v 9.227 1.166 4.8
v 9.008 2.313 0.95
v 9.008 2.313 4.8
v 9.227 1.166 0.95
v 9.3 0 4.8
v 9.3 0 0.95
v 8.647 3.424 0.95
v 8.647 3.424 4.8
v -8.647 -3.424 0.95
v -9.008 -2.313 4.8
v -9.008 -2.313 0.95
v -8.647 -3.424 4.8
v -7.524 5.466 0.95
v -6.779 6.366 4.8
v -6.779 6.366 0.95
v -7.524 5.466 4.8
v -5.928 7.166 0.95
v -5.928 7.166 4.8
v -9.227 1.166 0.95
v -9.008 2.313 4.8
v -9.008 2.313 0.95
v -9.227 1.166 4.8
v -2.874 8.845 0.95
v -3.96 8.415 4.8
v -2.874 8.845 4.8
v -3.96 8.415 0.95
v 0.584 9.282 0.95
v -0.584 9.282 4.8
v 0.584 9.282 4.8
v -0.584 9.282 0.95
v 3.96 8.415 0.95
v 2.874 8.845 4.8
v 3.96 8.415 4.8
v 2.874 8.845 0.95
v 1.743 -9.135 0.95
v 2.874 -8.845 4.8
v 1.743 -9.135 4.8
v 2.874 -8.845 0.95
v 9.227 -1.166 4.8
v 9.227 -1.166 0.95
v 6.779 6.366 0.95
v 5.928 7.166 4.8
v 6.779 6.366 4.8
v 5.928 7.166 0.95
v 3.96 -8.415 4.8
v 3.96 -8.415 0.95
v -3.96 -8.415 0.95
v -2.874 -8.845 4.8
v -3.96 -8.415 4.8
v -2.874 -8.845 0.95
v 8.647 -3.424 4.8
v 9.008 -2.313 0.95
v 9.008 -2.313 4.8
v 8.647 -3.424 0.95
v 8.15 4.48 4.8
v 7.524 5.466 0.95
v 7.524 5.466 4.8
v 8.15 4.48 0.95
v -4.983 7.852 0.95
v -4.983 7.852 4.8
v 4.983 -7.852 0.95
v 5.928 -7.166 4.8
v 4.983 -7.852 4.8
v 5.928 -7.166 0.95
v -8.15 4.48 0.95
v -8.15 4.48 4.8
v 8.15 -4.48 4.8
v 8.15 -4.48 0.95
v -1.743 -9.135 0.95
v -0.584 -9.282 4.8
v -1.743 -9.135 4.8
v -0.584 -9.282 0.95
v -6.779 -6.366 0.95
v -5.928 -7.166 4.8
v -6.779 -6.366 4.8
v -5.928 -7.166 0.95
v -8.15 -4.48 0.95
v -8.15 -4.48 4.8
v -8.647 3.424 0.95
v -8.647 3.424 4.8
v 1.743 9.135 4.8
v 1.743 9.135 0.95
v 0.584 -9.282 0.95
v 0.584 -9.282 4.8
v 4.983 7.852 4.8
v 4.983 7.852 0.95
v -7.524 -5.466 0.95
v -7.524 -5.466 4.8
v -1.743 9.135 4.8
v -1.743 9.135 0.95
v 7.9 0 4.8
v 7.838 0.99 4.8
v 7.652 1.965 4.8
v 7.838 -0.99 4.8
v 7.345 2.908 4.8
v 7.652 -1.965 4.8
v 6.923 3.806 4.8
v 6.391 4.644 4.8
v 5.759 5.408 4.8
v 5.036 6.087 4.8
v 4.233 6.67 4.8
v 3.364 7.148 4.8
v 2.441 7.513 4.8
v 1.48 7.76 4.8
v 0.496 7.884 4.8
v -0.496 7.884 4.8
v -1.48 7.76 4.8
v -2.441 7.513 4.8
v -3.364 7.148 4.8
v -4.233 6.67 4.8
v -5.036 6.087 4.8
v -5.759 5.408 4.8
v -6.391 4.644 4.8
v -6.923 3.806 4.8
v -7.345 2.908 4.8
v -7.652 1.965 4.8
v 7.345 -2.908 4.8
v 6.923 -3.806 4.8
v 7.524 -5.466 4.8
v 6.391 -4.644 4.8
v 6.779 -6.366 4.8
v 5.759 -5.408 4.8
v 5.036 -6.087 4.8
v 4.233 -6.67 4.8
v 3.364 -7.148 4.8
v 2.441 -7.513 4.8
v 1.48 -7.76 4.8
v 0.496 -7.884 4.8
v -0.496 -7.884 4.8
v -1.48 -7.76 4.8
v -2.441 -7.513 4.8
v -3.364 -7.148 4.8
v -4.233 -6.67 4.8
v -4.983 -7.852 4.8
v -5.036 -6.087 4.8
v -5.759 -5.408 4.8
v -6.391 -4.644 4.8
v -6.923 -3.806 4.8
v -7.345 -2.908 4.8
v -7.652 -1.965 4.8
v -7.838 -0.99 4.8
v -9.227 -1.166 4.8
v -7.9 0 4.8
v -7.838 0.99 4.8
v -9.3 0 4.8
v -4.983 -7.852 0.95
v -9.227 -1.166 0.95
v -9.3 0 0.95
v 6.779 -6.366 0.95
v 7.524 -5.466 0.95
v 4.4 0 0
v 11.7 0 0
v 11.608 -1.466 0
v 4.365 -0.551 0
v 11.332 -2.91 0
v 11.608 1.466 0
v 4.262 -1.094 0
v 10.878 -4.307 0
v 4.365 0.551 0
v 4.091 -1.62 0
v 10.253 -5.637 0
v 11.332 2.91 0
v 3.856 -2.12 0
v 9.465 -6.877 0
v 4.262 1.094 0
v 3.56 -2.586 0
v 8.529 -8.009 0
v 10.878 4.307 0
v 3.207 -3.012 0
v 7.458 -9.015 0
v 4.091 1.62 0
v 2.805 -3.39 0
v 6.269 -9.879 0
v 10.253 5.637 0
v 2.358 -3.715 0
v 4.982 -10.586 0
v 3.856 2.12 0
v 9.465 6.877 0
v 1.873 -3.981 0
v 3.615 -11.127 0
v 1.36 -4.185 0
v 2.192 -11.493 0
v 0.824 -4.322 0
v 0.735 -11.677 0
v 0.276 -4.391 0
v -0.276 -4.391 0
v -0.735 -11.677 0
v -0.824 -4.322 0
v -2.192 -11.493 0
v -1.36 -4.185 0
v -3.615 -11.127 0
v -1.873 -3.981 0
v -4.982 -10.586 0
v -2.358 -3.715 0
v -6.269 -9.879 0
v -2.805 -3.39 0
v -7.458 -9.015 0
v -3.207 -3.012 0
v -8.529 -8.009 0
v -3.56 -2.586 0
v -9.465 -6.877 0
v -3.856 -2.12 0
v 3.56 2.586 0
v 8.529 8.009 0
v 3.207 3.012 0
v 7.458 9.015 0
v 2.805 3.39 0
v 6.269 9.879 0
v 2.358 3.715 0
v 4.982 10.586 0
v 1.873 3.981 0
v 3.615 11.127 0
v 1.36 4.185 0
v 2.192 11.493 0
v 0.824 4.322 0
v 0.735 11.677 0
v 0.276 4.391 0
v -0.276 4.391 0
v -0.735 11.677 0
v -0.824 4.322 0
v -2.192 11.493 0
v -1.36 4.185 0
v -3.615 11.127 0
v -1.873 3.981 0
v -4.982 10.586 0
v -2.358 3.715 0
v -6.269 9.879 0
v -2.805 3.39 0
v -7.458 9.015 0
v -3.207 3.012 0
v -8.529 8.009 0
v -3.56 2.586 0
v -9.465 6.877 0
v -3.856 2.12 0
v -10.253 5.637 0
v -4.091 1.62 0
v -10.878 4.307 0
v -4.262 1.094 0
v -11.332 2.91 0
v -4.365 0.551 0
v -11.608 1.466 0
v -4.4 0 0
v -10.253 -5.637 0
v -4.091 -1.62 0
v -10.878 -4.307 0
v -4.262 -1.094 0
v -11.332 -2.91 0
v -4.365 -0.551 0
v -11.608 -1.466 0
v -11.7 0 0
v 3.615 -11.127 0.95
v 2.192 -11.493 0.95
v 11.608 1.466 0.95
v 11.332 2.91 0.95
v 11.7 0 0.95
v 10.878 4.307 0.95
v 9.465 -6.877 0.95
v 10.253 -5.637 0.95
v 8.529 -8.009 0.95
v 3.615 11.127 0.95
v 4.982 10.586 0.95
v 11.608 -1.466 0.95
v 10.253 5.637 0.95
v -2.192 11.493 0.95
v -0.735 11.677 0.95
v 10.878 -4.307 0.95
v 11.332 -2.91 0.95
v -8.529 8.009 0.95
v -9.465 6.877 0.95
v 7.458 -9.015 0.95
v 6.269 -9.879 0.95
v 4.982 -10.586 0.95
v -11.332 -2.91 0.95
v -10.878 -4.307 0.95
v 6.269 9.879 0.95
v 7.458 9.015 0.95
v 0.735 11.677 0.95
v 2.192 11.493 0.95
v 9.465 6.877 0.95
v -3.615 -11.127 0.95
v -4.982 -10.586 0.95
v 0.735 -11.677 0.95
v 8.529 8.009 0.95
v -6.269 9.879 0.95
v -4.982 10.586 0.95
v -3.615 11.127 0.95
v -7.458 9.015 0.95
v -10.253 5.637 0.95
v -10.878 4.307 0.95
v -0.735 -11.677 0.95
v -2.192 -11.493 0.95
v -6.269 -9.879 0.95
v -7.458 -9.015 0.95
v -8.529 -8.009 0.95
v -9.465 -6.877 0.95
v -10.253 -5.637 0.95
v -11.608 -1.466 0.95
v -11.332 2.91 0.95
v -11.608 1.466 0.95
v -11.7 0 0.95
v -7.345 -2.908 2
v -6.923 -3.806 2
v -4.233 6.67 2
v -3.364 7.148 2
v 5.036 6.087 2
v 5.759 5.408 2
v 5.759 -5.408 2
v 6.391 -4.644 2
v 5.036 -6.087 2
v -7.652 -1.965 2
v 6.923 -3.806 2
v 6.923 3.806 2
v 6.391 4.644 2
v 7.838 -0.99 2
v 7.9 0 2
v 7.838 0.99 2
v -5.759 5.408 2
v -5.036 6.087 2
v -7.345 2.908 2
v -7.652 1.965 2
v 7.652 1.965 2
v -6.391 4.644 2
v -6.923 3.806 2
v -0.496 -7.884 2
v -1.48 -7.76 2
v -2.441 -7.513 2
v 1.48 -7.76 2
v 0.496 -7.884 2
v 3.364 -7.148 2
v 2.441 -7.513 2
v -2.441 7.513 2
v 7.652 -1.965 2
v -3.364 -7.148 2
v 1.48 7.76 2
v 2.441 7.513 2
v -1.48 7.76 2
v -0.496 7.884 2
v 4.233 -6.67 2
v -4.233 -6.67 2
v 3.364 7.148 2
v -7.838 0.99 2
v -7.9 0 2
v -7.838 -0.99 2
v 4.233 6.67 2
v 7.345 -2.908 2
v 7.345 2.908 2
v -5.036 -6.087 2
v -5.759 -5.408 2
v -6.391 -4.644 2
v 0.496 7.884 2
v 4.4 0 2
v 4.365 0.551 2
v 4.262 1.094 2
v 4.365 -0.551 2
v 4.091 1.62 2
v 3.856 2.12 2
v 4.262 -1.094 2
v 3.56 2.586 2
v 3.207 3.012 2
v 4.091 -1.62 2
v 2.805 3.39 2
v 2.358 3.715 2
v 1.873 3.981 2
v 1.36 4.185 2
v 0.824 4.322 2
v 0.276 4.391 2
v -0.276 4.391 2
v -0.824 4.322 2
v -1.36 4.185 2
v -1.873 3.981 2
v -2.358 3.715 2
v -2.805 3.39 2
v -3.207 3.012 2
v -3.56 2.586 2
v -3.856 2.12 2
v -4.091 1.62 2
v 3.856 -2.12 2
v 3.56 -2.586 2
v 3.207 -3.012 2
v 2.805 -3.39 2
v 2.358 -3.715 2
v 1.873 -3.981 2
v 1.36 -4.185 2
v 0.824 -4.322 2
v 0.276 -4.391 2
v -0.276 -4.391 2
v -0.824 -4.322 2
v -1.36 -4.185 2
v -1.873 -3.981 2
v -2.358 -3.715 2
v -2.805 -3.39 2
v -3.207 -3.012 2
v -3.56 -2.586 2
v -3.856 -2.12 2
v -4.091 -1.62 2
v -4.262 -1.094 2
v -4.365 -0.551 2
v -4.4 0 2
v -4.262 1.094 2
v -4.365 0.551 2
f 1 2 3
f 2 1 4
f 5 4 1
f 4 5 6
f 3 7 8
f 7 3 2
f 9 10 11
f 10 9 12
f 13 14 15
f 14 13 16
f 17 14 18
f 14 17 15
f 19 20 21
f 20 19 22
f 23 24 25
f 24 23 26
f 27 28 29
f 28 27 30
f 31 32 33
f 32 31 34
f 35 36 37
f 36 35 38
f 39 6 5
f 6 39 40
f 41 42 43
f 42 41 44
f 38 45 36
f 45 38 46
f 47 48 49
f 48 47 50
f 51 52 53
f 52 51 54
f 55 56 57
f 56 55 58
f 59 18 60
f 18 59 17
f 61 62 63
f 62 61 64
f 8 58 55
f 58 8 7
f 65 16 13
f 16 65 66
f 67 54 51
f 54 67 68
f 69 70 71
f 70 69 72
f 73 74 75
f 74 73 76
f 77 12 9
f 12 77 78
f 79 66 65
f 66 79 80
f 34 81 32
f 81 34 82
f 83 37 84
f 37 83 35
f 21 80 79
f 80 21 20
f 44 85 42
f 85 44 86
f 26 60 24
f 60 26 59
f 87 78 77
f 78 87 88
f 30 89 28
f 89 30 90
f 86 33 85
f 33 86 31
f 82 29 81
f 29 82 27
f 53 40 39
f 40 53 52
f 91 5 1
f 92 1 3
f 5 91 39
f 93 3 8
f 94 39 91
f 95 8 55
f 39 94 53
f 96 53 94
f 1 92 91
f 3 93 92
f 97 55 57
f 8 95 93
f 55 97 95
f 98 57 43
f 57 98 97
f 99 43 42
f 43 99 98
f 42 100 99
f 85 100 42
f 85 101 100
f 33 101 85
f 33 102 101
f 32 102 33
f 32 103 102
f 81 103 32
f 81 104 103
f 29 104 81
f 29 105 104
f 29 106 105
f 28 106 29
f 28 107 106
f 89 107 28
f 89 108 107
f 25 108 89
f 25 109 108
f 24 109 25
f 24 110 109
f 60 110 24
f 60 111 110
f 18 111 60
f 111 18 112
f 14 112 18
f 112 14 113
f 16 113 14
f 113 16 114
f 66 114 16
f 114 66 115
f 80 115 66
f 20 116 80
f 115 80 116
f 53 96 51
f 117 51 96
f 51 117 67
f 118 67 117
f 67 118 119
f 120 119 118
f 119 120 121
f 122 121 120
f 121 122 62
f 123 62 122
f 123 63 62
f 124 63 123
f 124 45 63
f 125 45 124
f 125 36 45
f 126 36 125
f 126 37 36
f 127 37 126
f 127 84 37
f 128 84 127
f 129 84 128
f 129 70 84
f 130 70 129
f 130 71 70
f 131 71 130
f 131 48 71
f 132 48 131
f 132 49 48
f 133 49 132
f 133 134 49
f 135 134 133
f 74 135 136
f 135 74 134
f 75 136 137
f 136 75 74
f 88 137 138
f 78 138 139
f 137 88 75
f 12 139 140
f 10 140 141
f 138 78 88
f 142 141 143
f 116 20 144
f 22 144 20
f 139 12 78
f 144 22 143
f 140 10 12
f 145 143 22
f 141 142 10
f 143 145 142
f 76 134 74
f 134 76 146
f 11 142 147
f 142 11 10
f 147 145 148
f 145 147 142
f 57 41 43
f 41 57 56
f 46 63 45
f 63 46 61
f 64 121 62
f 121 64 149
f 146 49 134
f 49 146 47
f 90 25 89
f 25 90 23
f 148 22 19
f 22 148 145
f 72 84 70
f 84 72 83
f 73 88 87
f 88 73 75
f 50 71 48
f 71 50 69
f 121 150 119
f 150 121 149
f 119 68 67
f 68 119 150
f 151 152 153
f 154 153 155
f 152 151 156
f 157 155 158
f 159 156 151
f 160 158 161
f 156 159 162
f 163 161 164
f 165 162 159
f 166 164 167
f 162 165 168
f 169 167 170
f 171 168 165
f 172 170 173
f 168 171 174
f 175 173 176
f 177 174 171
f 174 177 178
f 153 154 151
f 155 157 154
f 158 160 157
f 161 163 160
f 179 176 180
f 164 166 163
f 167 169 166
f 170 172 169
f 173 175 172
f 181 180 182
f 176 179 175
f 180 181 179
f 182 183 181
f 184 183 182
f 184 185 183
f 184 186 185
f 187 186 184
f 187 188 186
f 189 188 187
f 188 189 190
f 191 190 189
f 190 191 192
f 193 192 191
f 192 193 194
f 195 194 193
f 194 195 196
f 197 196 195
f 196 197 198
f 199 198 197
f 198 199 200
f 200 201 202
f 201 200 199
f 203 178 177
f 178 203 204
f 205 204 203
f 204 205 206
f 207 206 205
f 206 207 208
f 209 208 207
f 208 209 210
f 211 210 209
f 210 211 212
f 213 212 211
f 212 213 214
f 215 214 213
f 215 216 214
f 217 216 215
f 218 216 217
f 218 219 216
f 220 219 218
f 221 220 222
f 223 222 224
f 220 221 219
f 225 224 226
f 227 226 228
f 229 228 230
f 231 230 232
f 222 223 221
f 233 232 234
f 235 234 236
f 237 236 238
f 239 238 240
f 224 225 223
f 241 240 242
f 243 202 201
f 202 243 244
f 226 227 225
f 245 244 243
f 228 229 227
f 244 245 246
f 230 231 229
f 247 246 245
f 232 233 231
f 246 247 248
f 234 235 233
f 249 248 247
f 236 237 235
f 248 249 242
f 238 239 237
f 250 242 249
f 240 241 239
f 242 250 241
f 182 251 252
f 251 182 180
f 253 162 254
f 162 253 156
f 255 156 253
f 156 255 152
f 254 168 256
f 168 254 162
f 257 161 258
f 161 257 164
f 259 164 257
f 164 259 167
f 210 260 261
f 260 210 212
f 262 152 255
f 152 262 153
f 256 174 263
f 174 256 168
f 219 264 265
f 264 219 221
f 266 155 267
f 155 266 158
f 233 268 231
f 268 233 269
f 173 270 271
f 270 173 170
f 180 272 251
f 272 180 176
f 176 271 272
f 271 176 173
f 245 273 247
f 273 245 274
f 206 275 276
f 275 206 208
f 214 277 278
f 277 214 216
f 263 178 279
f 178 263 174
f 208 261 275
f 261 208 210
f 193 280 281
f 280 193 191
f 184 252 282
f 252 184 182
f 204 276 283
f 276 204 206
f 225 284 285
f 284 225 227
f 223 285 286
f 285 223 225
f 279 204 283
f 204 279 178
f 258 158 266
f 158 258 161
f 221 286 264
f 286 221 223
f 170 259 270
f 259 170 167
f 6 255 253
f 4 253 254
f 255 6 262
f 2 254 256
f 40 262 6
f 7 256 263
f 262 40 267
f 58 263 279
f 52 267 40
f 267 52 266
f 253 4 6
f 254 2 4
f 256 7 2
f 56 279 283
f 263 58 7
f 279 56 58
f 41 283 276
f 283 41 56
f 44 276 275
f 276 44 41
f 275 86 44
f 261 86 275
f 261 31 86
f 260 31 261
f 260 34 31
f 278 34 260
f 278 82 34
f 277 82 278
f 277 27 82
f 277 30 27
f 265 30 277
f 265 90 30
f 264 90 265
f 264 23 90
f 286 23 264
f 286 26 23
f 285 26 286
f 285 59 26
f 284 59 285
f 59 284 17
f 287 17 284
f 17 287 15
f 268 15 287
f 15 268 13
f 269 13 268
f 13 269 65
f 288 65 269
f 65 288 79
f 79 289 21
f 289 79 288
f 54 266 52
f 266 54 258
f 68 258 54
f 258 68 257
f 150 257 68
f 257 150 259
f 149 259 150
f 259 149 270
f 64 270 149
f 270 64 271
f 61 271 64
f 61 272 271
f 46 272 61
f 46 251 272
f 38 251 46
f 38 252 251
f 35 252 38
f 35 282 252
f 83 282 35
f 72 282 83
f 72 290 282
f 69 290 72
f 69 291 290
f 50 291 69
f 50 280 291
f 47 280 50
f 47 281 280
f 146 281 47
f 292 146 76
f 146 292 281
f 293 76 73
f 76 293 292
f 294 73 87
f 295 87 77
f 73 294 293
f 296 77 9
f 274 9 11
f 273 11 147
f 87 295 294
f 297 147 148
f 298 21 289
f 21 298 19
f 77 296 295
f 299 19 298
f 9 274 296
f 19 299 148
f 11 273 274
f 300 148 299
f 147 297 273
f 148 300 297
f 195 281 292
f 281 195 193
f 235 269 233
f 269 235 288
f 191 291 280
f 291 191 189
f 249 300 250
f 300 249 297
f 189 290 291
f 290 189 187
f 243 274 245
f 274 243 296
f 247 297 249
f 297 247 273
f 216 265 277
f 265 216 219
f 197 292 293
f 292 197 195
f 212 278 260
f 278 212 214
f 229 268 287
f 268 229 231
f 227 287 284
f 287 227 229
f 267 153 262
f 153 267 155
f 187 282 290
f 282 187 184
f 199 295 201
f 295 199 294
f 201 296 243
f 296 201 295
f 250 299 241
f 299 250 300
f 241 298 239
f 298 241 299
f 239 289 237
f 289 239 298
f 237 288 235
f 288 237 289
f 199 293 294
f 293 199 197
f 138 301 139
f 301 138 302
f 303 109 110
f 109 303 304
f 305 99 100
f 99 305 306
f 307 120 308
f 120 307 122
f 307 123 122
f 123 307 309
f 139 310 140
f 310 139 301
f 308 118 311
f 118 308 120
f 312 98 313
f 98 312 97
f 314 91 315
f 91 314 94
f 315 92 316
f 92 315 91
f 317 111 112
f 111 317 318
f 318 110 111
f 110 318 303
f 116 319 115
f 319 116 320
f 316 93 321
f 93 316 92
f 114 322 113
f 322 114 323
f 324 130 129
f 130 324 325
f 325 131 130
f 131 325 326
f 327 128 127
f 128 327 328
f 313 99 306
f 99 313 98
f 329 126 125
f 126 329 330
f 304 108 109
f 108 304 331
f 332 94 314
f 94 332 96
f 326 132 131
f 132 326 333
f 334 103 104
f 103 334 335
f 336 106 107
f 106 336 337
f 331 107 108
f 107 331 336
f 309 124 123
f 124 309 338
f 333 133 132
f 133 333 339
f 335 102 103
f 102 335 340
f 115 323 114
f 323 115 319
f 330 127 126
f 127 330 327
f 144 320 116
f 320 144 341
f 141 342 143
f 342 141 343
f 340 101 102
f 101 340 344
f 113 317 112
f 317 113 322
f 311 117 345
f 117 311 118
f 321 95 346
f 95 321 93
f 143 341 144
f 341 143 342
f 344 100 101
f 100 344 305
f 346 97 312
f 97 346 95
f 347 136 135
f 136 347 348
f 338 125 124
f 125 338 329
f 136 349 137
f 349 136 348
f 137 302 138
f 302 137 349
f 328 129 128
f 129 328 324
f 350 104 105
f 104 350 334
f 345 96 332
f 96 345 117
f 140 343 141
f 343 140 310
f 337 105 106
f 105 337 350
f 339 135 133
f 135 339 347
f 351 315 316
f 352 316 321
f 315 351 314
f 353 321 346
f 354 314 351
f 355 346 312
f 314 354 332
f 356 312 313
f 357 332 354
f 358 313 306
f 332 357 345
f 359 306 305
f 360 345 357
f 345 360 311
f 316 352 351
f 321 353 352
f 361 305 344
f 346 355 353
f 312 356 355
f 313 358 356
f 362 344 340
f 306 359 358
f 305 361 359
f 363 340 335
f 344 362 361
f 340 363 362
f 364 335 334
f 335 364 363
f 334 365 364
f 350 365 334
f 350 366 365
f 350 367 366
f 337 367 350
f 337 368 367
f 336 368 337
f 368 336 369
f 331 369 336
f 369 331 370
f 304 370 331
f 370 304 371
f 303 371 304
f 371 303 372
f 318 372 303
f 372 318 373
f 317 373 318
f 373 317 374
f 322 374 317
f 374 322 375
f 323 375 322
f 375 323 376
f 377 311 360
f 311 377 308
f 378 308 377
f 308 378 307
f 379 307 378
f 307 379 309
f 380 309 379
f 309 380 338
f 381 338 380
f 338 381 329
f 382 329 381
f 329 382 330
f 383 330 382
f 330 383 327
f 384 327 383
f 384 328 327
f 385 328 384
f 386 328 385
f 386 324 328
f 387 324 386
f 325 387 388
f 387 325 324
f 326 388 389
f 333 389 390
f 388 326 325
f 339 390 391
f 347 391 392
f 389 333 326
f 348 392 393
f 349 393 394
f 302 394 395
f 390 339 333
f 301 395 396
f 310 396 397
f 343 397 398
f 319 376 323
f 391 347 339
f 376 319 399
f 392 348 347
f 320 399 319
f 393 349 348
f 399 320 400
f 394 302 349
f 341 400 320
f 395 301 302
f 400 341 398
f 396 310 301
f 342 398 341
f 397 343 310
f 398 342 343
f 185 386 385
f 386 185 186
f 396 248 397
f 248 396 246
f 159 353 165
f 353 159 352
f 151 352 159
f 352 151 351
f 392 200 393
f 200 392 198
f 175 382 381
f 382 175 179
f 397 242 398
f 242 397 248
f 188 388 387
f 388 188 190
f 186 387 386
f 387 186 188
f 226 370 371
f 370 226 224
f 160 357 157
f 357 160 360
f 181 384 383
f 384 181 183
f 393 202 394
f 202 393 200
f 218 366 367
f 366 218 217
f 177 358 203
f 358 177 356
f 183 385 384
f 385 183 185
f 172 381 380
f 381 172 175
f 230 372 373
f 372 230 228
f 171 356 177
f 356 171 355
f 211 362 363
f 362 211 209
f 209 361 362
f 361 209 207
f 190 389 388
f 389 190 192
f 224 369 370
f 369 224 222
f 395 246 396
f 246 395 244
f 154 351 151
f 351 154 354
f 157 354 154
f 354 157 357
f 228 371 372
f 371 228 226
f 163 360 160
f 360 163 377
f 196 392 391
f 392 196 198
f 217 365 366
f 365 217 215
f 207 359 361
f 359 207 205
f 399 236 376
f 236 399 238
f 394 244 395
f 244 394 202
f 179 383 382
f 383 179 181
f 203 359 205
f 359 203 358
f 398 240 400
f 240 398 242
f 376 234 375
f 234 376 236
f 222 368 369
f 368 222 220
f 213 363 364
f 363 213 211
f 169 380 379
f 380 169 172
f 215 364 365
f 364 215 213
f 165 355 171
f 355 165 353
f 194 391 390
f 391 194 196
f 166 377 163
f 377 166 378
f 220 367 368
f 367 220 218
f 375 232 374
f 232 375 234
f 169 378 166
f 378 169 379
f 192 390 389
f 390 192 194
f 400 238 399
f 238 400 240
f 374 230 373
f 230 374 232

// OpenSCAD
// PRUSA iteration3
// 624 bearing belt guide
// GNU GPL v3
// Josef Průša <iam@josefprusa.cz> and contributors
// http://www.reprap.org/wiki/Prusa_Mendel
// http://prusamendel.org

wall= 1.2;
clearence= 0.1; 

module belt_guide_base(){
 cylinder(r=8+wall+clearence, h=5-0.2, $fn=50);
 cylinder(r=8+wall+clearence+2*wall, h=0.95, $fn=50);
}

module belt_guide_holes(){
 translate([0,0,2]) cylinder(r=7.8+clearence, h=10, $fn=50);
 translate([0,0,-1]) cylinder(r=5.5+wall+clearence-2*wall, h=10, $fn=50);
}

// Final part
module belt_guide(){
 difference(){
  belt_guide_base();
  belt_guide_holes();
 }
}

belt_guide();
